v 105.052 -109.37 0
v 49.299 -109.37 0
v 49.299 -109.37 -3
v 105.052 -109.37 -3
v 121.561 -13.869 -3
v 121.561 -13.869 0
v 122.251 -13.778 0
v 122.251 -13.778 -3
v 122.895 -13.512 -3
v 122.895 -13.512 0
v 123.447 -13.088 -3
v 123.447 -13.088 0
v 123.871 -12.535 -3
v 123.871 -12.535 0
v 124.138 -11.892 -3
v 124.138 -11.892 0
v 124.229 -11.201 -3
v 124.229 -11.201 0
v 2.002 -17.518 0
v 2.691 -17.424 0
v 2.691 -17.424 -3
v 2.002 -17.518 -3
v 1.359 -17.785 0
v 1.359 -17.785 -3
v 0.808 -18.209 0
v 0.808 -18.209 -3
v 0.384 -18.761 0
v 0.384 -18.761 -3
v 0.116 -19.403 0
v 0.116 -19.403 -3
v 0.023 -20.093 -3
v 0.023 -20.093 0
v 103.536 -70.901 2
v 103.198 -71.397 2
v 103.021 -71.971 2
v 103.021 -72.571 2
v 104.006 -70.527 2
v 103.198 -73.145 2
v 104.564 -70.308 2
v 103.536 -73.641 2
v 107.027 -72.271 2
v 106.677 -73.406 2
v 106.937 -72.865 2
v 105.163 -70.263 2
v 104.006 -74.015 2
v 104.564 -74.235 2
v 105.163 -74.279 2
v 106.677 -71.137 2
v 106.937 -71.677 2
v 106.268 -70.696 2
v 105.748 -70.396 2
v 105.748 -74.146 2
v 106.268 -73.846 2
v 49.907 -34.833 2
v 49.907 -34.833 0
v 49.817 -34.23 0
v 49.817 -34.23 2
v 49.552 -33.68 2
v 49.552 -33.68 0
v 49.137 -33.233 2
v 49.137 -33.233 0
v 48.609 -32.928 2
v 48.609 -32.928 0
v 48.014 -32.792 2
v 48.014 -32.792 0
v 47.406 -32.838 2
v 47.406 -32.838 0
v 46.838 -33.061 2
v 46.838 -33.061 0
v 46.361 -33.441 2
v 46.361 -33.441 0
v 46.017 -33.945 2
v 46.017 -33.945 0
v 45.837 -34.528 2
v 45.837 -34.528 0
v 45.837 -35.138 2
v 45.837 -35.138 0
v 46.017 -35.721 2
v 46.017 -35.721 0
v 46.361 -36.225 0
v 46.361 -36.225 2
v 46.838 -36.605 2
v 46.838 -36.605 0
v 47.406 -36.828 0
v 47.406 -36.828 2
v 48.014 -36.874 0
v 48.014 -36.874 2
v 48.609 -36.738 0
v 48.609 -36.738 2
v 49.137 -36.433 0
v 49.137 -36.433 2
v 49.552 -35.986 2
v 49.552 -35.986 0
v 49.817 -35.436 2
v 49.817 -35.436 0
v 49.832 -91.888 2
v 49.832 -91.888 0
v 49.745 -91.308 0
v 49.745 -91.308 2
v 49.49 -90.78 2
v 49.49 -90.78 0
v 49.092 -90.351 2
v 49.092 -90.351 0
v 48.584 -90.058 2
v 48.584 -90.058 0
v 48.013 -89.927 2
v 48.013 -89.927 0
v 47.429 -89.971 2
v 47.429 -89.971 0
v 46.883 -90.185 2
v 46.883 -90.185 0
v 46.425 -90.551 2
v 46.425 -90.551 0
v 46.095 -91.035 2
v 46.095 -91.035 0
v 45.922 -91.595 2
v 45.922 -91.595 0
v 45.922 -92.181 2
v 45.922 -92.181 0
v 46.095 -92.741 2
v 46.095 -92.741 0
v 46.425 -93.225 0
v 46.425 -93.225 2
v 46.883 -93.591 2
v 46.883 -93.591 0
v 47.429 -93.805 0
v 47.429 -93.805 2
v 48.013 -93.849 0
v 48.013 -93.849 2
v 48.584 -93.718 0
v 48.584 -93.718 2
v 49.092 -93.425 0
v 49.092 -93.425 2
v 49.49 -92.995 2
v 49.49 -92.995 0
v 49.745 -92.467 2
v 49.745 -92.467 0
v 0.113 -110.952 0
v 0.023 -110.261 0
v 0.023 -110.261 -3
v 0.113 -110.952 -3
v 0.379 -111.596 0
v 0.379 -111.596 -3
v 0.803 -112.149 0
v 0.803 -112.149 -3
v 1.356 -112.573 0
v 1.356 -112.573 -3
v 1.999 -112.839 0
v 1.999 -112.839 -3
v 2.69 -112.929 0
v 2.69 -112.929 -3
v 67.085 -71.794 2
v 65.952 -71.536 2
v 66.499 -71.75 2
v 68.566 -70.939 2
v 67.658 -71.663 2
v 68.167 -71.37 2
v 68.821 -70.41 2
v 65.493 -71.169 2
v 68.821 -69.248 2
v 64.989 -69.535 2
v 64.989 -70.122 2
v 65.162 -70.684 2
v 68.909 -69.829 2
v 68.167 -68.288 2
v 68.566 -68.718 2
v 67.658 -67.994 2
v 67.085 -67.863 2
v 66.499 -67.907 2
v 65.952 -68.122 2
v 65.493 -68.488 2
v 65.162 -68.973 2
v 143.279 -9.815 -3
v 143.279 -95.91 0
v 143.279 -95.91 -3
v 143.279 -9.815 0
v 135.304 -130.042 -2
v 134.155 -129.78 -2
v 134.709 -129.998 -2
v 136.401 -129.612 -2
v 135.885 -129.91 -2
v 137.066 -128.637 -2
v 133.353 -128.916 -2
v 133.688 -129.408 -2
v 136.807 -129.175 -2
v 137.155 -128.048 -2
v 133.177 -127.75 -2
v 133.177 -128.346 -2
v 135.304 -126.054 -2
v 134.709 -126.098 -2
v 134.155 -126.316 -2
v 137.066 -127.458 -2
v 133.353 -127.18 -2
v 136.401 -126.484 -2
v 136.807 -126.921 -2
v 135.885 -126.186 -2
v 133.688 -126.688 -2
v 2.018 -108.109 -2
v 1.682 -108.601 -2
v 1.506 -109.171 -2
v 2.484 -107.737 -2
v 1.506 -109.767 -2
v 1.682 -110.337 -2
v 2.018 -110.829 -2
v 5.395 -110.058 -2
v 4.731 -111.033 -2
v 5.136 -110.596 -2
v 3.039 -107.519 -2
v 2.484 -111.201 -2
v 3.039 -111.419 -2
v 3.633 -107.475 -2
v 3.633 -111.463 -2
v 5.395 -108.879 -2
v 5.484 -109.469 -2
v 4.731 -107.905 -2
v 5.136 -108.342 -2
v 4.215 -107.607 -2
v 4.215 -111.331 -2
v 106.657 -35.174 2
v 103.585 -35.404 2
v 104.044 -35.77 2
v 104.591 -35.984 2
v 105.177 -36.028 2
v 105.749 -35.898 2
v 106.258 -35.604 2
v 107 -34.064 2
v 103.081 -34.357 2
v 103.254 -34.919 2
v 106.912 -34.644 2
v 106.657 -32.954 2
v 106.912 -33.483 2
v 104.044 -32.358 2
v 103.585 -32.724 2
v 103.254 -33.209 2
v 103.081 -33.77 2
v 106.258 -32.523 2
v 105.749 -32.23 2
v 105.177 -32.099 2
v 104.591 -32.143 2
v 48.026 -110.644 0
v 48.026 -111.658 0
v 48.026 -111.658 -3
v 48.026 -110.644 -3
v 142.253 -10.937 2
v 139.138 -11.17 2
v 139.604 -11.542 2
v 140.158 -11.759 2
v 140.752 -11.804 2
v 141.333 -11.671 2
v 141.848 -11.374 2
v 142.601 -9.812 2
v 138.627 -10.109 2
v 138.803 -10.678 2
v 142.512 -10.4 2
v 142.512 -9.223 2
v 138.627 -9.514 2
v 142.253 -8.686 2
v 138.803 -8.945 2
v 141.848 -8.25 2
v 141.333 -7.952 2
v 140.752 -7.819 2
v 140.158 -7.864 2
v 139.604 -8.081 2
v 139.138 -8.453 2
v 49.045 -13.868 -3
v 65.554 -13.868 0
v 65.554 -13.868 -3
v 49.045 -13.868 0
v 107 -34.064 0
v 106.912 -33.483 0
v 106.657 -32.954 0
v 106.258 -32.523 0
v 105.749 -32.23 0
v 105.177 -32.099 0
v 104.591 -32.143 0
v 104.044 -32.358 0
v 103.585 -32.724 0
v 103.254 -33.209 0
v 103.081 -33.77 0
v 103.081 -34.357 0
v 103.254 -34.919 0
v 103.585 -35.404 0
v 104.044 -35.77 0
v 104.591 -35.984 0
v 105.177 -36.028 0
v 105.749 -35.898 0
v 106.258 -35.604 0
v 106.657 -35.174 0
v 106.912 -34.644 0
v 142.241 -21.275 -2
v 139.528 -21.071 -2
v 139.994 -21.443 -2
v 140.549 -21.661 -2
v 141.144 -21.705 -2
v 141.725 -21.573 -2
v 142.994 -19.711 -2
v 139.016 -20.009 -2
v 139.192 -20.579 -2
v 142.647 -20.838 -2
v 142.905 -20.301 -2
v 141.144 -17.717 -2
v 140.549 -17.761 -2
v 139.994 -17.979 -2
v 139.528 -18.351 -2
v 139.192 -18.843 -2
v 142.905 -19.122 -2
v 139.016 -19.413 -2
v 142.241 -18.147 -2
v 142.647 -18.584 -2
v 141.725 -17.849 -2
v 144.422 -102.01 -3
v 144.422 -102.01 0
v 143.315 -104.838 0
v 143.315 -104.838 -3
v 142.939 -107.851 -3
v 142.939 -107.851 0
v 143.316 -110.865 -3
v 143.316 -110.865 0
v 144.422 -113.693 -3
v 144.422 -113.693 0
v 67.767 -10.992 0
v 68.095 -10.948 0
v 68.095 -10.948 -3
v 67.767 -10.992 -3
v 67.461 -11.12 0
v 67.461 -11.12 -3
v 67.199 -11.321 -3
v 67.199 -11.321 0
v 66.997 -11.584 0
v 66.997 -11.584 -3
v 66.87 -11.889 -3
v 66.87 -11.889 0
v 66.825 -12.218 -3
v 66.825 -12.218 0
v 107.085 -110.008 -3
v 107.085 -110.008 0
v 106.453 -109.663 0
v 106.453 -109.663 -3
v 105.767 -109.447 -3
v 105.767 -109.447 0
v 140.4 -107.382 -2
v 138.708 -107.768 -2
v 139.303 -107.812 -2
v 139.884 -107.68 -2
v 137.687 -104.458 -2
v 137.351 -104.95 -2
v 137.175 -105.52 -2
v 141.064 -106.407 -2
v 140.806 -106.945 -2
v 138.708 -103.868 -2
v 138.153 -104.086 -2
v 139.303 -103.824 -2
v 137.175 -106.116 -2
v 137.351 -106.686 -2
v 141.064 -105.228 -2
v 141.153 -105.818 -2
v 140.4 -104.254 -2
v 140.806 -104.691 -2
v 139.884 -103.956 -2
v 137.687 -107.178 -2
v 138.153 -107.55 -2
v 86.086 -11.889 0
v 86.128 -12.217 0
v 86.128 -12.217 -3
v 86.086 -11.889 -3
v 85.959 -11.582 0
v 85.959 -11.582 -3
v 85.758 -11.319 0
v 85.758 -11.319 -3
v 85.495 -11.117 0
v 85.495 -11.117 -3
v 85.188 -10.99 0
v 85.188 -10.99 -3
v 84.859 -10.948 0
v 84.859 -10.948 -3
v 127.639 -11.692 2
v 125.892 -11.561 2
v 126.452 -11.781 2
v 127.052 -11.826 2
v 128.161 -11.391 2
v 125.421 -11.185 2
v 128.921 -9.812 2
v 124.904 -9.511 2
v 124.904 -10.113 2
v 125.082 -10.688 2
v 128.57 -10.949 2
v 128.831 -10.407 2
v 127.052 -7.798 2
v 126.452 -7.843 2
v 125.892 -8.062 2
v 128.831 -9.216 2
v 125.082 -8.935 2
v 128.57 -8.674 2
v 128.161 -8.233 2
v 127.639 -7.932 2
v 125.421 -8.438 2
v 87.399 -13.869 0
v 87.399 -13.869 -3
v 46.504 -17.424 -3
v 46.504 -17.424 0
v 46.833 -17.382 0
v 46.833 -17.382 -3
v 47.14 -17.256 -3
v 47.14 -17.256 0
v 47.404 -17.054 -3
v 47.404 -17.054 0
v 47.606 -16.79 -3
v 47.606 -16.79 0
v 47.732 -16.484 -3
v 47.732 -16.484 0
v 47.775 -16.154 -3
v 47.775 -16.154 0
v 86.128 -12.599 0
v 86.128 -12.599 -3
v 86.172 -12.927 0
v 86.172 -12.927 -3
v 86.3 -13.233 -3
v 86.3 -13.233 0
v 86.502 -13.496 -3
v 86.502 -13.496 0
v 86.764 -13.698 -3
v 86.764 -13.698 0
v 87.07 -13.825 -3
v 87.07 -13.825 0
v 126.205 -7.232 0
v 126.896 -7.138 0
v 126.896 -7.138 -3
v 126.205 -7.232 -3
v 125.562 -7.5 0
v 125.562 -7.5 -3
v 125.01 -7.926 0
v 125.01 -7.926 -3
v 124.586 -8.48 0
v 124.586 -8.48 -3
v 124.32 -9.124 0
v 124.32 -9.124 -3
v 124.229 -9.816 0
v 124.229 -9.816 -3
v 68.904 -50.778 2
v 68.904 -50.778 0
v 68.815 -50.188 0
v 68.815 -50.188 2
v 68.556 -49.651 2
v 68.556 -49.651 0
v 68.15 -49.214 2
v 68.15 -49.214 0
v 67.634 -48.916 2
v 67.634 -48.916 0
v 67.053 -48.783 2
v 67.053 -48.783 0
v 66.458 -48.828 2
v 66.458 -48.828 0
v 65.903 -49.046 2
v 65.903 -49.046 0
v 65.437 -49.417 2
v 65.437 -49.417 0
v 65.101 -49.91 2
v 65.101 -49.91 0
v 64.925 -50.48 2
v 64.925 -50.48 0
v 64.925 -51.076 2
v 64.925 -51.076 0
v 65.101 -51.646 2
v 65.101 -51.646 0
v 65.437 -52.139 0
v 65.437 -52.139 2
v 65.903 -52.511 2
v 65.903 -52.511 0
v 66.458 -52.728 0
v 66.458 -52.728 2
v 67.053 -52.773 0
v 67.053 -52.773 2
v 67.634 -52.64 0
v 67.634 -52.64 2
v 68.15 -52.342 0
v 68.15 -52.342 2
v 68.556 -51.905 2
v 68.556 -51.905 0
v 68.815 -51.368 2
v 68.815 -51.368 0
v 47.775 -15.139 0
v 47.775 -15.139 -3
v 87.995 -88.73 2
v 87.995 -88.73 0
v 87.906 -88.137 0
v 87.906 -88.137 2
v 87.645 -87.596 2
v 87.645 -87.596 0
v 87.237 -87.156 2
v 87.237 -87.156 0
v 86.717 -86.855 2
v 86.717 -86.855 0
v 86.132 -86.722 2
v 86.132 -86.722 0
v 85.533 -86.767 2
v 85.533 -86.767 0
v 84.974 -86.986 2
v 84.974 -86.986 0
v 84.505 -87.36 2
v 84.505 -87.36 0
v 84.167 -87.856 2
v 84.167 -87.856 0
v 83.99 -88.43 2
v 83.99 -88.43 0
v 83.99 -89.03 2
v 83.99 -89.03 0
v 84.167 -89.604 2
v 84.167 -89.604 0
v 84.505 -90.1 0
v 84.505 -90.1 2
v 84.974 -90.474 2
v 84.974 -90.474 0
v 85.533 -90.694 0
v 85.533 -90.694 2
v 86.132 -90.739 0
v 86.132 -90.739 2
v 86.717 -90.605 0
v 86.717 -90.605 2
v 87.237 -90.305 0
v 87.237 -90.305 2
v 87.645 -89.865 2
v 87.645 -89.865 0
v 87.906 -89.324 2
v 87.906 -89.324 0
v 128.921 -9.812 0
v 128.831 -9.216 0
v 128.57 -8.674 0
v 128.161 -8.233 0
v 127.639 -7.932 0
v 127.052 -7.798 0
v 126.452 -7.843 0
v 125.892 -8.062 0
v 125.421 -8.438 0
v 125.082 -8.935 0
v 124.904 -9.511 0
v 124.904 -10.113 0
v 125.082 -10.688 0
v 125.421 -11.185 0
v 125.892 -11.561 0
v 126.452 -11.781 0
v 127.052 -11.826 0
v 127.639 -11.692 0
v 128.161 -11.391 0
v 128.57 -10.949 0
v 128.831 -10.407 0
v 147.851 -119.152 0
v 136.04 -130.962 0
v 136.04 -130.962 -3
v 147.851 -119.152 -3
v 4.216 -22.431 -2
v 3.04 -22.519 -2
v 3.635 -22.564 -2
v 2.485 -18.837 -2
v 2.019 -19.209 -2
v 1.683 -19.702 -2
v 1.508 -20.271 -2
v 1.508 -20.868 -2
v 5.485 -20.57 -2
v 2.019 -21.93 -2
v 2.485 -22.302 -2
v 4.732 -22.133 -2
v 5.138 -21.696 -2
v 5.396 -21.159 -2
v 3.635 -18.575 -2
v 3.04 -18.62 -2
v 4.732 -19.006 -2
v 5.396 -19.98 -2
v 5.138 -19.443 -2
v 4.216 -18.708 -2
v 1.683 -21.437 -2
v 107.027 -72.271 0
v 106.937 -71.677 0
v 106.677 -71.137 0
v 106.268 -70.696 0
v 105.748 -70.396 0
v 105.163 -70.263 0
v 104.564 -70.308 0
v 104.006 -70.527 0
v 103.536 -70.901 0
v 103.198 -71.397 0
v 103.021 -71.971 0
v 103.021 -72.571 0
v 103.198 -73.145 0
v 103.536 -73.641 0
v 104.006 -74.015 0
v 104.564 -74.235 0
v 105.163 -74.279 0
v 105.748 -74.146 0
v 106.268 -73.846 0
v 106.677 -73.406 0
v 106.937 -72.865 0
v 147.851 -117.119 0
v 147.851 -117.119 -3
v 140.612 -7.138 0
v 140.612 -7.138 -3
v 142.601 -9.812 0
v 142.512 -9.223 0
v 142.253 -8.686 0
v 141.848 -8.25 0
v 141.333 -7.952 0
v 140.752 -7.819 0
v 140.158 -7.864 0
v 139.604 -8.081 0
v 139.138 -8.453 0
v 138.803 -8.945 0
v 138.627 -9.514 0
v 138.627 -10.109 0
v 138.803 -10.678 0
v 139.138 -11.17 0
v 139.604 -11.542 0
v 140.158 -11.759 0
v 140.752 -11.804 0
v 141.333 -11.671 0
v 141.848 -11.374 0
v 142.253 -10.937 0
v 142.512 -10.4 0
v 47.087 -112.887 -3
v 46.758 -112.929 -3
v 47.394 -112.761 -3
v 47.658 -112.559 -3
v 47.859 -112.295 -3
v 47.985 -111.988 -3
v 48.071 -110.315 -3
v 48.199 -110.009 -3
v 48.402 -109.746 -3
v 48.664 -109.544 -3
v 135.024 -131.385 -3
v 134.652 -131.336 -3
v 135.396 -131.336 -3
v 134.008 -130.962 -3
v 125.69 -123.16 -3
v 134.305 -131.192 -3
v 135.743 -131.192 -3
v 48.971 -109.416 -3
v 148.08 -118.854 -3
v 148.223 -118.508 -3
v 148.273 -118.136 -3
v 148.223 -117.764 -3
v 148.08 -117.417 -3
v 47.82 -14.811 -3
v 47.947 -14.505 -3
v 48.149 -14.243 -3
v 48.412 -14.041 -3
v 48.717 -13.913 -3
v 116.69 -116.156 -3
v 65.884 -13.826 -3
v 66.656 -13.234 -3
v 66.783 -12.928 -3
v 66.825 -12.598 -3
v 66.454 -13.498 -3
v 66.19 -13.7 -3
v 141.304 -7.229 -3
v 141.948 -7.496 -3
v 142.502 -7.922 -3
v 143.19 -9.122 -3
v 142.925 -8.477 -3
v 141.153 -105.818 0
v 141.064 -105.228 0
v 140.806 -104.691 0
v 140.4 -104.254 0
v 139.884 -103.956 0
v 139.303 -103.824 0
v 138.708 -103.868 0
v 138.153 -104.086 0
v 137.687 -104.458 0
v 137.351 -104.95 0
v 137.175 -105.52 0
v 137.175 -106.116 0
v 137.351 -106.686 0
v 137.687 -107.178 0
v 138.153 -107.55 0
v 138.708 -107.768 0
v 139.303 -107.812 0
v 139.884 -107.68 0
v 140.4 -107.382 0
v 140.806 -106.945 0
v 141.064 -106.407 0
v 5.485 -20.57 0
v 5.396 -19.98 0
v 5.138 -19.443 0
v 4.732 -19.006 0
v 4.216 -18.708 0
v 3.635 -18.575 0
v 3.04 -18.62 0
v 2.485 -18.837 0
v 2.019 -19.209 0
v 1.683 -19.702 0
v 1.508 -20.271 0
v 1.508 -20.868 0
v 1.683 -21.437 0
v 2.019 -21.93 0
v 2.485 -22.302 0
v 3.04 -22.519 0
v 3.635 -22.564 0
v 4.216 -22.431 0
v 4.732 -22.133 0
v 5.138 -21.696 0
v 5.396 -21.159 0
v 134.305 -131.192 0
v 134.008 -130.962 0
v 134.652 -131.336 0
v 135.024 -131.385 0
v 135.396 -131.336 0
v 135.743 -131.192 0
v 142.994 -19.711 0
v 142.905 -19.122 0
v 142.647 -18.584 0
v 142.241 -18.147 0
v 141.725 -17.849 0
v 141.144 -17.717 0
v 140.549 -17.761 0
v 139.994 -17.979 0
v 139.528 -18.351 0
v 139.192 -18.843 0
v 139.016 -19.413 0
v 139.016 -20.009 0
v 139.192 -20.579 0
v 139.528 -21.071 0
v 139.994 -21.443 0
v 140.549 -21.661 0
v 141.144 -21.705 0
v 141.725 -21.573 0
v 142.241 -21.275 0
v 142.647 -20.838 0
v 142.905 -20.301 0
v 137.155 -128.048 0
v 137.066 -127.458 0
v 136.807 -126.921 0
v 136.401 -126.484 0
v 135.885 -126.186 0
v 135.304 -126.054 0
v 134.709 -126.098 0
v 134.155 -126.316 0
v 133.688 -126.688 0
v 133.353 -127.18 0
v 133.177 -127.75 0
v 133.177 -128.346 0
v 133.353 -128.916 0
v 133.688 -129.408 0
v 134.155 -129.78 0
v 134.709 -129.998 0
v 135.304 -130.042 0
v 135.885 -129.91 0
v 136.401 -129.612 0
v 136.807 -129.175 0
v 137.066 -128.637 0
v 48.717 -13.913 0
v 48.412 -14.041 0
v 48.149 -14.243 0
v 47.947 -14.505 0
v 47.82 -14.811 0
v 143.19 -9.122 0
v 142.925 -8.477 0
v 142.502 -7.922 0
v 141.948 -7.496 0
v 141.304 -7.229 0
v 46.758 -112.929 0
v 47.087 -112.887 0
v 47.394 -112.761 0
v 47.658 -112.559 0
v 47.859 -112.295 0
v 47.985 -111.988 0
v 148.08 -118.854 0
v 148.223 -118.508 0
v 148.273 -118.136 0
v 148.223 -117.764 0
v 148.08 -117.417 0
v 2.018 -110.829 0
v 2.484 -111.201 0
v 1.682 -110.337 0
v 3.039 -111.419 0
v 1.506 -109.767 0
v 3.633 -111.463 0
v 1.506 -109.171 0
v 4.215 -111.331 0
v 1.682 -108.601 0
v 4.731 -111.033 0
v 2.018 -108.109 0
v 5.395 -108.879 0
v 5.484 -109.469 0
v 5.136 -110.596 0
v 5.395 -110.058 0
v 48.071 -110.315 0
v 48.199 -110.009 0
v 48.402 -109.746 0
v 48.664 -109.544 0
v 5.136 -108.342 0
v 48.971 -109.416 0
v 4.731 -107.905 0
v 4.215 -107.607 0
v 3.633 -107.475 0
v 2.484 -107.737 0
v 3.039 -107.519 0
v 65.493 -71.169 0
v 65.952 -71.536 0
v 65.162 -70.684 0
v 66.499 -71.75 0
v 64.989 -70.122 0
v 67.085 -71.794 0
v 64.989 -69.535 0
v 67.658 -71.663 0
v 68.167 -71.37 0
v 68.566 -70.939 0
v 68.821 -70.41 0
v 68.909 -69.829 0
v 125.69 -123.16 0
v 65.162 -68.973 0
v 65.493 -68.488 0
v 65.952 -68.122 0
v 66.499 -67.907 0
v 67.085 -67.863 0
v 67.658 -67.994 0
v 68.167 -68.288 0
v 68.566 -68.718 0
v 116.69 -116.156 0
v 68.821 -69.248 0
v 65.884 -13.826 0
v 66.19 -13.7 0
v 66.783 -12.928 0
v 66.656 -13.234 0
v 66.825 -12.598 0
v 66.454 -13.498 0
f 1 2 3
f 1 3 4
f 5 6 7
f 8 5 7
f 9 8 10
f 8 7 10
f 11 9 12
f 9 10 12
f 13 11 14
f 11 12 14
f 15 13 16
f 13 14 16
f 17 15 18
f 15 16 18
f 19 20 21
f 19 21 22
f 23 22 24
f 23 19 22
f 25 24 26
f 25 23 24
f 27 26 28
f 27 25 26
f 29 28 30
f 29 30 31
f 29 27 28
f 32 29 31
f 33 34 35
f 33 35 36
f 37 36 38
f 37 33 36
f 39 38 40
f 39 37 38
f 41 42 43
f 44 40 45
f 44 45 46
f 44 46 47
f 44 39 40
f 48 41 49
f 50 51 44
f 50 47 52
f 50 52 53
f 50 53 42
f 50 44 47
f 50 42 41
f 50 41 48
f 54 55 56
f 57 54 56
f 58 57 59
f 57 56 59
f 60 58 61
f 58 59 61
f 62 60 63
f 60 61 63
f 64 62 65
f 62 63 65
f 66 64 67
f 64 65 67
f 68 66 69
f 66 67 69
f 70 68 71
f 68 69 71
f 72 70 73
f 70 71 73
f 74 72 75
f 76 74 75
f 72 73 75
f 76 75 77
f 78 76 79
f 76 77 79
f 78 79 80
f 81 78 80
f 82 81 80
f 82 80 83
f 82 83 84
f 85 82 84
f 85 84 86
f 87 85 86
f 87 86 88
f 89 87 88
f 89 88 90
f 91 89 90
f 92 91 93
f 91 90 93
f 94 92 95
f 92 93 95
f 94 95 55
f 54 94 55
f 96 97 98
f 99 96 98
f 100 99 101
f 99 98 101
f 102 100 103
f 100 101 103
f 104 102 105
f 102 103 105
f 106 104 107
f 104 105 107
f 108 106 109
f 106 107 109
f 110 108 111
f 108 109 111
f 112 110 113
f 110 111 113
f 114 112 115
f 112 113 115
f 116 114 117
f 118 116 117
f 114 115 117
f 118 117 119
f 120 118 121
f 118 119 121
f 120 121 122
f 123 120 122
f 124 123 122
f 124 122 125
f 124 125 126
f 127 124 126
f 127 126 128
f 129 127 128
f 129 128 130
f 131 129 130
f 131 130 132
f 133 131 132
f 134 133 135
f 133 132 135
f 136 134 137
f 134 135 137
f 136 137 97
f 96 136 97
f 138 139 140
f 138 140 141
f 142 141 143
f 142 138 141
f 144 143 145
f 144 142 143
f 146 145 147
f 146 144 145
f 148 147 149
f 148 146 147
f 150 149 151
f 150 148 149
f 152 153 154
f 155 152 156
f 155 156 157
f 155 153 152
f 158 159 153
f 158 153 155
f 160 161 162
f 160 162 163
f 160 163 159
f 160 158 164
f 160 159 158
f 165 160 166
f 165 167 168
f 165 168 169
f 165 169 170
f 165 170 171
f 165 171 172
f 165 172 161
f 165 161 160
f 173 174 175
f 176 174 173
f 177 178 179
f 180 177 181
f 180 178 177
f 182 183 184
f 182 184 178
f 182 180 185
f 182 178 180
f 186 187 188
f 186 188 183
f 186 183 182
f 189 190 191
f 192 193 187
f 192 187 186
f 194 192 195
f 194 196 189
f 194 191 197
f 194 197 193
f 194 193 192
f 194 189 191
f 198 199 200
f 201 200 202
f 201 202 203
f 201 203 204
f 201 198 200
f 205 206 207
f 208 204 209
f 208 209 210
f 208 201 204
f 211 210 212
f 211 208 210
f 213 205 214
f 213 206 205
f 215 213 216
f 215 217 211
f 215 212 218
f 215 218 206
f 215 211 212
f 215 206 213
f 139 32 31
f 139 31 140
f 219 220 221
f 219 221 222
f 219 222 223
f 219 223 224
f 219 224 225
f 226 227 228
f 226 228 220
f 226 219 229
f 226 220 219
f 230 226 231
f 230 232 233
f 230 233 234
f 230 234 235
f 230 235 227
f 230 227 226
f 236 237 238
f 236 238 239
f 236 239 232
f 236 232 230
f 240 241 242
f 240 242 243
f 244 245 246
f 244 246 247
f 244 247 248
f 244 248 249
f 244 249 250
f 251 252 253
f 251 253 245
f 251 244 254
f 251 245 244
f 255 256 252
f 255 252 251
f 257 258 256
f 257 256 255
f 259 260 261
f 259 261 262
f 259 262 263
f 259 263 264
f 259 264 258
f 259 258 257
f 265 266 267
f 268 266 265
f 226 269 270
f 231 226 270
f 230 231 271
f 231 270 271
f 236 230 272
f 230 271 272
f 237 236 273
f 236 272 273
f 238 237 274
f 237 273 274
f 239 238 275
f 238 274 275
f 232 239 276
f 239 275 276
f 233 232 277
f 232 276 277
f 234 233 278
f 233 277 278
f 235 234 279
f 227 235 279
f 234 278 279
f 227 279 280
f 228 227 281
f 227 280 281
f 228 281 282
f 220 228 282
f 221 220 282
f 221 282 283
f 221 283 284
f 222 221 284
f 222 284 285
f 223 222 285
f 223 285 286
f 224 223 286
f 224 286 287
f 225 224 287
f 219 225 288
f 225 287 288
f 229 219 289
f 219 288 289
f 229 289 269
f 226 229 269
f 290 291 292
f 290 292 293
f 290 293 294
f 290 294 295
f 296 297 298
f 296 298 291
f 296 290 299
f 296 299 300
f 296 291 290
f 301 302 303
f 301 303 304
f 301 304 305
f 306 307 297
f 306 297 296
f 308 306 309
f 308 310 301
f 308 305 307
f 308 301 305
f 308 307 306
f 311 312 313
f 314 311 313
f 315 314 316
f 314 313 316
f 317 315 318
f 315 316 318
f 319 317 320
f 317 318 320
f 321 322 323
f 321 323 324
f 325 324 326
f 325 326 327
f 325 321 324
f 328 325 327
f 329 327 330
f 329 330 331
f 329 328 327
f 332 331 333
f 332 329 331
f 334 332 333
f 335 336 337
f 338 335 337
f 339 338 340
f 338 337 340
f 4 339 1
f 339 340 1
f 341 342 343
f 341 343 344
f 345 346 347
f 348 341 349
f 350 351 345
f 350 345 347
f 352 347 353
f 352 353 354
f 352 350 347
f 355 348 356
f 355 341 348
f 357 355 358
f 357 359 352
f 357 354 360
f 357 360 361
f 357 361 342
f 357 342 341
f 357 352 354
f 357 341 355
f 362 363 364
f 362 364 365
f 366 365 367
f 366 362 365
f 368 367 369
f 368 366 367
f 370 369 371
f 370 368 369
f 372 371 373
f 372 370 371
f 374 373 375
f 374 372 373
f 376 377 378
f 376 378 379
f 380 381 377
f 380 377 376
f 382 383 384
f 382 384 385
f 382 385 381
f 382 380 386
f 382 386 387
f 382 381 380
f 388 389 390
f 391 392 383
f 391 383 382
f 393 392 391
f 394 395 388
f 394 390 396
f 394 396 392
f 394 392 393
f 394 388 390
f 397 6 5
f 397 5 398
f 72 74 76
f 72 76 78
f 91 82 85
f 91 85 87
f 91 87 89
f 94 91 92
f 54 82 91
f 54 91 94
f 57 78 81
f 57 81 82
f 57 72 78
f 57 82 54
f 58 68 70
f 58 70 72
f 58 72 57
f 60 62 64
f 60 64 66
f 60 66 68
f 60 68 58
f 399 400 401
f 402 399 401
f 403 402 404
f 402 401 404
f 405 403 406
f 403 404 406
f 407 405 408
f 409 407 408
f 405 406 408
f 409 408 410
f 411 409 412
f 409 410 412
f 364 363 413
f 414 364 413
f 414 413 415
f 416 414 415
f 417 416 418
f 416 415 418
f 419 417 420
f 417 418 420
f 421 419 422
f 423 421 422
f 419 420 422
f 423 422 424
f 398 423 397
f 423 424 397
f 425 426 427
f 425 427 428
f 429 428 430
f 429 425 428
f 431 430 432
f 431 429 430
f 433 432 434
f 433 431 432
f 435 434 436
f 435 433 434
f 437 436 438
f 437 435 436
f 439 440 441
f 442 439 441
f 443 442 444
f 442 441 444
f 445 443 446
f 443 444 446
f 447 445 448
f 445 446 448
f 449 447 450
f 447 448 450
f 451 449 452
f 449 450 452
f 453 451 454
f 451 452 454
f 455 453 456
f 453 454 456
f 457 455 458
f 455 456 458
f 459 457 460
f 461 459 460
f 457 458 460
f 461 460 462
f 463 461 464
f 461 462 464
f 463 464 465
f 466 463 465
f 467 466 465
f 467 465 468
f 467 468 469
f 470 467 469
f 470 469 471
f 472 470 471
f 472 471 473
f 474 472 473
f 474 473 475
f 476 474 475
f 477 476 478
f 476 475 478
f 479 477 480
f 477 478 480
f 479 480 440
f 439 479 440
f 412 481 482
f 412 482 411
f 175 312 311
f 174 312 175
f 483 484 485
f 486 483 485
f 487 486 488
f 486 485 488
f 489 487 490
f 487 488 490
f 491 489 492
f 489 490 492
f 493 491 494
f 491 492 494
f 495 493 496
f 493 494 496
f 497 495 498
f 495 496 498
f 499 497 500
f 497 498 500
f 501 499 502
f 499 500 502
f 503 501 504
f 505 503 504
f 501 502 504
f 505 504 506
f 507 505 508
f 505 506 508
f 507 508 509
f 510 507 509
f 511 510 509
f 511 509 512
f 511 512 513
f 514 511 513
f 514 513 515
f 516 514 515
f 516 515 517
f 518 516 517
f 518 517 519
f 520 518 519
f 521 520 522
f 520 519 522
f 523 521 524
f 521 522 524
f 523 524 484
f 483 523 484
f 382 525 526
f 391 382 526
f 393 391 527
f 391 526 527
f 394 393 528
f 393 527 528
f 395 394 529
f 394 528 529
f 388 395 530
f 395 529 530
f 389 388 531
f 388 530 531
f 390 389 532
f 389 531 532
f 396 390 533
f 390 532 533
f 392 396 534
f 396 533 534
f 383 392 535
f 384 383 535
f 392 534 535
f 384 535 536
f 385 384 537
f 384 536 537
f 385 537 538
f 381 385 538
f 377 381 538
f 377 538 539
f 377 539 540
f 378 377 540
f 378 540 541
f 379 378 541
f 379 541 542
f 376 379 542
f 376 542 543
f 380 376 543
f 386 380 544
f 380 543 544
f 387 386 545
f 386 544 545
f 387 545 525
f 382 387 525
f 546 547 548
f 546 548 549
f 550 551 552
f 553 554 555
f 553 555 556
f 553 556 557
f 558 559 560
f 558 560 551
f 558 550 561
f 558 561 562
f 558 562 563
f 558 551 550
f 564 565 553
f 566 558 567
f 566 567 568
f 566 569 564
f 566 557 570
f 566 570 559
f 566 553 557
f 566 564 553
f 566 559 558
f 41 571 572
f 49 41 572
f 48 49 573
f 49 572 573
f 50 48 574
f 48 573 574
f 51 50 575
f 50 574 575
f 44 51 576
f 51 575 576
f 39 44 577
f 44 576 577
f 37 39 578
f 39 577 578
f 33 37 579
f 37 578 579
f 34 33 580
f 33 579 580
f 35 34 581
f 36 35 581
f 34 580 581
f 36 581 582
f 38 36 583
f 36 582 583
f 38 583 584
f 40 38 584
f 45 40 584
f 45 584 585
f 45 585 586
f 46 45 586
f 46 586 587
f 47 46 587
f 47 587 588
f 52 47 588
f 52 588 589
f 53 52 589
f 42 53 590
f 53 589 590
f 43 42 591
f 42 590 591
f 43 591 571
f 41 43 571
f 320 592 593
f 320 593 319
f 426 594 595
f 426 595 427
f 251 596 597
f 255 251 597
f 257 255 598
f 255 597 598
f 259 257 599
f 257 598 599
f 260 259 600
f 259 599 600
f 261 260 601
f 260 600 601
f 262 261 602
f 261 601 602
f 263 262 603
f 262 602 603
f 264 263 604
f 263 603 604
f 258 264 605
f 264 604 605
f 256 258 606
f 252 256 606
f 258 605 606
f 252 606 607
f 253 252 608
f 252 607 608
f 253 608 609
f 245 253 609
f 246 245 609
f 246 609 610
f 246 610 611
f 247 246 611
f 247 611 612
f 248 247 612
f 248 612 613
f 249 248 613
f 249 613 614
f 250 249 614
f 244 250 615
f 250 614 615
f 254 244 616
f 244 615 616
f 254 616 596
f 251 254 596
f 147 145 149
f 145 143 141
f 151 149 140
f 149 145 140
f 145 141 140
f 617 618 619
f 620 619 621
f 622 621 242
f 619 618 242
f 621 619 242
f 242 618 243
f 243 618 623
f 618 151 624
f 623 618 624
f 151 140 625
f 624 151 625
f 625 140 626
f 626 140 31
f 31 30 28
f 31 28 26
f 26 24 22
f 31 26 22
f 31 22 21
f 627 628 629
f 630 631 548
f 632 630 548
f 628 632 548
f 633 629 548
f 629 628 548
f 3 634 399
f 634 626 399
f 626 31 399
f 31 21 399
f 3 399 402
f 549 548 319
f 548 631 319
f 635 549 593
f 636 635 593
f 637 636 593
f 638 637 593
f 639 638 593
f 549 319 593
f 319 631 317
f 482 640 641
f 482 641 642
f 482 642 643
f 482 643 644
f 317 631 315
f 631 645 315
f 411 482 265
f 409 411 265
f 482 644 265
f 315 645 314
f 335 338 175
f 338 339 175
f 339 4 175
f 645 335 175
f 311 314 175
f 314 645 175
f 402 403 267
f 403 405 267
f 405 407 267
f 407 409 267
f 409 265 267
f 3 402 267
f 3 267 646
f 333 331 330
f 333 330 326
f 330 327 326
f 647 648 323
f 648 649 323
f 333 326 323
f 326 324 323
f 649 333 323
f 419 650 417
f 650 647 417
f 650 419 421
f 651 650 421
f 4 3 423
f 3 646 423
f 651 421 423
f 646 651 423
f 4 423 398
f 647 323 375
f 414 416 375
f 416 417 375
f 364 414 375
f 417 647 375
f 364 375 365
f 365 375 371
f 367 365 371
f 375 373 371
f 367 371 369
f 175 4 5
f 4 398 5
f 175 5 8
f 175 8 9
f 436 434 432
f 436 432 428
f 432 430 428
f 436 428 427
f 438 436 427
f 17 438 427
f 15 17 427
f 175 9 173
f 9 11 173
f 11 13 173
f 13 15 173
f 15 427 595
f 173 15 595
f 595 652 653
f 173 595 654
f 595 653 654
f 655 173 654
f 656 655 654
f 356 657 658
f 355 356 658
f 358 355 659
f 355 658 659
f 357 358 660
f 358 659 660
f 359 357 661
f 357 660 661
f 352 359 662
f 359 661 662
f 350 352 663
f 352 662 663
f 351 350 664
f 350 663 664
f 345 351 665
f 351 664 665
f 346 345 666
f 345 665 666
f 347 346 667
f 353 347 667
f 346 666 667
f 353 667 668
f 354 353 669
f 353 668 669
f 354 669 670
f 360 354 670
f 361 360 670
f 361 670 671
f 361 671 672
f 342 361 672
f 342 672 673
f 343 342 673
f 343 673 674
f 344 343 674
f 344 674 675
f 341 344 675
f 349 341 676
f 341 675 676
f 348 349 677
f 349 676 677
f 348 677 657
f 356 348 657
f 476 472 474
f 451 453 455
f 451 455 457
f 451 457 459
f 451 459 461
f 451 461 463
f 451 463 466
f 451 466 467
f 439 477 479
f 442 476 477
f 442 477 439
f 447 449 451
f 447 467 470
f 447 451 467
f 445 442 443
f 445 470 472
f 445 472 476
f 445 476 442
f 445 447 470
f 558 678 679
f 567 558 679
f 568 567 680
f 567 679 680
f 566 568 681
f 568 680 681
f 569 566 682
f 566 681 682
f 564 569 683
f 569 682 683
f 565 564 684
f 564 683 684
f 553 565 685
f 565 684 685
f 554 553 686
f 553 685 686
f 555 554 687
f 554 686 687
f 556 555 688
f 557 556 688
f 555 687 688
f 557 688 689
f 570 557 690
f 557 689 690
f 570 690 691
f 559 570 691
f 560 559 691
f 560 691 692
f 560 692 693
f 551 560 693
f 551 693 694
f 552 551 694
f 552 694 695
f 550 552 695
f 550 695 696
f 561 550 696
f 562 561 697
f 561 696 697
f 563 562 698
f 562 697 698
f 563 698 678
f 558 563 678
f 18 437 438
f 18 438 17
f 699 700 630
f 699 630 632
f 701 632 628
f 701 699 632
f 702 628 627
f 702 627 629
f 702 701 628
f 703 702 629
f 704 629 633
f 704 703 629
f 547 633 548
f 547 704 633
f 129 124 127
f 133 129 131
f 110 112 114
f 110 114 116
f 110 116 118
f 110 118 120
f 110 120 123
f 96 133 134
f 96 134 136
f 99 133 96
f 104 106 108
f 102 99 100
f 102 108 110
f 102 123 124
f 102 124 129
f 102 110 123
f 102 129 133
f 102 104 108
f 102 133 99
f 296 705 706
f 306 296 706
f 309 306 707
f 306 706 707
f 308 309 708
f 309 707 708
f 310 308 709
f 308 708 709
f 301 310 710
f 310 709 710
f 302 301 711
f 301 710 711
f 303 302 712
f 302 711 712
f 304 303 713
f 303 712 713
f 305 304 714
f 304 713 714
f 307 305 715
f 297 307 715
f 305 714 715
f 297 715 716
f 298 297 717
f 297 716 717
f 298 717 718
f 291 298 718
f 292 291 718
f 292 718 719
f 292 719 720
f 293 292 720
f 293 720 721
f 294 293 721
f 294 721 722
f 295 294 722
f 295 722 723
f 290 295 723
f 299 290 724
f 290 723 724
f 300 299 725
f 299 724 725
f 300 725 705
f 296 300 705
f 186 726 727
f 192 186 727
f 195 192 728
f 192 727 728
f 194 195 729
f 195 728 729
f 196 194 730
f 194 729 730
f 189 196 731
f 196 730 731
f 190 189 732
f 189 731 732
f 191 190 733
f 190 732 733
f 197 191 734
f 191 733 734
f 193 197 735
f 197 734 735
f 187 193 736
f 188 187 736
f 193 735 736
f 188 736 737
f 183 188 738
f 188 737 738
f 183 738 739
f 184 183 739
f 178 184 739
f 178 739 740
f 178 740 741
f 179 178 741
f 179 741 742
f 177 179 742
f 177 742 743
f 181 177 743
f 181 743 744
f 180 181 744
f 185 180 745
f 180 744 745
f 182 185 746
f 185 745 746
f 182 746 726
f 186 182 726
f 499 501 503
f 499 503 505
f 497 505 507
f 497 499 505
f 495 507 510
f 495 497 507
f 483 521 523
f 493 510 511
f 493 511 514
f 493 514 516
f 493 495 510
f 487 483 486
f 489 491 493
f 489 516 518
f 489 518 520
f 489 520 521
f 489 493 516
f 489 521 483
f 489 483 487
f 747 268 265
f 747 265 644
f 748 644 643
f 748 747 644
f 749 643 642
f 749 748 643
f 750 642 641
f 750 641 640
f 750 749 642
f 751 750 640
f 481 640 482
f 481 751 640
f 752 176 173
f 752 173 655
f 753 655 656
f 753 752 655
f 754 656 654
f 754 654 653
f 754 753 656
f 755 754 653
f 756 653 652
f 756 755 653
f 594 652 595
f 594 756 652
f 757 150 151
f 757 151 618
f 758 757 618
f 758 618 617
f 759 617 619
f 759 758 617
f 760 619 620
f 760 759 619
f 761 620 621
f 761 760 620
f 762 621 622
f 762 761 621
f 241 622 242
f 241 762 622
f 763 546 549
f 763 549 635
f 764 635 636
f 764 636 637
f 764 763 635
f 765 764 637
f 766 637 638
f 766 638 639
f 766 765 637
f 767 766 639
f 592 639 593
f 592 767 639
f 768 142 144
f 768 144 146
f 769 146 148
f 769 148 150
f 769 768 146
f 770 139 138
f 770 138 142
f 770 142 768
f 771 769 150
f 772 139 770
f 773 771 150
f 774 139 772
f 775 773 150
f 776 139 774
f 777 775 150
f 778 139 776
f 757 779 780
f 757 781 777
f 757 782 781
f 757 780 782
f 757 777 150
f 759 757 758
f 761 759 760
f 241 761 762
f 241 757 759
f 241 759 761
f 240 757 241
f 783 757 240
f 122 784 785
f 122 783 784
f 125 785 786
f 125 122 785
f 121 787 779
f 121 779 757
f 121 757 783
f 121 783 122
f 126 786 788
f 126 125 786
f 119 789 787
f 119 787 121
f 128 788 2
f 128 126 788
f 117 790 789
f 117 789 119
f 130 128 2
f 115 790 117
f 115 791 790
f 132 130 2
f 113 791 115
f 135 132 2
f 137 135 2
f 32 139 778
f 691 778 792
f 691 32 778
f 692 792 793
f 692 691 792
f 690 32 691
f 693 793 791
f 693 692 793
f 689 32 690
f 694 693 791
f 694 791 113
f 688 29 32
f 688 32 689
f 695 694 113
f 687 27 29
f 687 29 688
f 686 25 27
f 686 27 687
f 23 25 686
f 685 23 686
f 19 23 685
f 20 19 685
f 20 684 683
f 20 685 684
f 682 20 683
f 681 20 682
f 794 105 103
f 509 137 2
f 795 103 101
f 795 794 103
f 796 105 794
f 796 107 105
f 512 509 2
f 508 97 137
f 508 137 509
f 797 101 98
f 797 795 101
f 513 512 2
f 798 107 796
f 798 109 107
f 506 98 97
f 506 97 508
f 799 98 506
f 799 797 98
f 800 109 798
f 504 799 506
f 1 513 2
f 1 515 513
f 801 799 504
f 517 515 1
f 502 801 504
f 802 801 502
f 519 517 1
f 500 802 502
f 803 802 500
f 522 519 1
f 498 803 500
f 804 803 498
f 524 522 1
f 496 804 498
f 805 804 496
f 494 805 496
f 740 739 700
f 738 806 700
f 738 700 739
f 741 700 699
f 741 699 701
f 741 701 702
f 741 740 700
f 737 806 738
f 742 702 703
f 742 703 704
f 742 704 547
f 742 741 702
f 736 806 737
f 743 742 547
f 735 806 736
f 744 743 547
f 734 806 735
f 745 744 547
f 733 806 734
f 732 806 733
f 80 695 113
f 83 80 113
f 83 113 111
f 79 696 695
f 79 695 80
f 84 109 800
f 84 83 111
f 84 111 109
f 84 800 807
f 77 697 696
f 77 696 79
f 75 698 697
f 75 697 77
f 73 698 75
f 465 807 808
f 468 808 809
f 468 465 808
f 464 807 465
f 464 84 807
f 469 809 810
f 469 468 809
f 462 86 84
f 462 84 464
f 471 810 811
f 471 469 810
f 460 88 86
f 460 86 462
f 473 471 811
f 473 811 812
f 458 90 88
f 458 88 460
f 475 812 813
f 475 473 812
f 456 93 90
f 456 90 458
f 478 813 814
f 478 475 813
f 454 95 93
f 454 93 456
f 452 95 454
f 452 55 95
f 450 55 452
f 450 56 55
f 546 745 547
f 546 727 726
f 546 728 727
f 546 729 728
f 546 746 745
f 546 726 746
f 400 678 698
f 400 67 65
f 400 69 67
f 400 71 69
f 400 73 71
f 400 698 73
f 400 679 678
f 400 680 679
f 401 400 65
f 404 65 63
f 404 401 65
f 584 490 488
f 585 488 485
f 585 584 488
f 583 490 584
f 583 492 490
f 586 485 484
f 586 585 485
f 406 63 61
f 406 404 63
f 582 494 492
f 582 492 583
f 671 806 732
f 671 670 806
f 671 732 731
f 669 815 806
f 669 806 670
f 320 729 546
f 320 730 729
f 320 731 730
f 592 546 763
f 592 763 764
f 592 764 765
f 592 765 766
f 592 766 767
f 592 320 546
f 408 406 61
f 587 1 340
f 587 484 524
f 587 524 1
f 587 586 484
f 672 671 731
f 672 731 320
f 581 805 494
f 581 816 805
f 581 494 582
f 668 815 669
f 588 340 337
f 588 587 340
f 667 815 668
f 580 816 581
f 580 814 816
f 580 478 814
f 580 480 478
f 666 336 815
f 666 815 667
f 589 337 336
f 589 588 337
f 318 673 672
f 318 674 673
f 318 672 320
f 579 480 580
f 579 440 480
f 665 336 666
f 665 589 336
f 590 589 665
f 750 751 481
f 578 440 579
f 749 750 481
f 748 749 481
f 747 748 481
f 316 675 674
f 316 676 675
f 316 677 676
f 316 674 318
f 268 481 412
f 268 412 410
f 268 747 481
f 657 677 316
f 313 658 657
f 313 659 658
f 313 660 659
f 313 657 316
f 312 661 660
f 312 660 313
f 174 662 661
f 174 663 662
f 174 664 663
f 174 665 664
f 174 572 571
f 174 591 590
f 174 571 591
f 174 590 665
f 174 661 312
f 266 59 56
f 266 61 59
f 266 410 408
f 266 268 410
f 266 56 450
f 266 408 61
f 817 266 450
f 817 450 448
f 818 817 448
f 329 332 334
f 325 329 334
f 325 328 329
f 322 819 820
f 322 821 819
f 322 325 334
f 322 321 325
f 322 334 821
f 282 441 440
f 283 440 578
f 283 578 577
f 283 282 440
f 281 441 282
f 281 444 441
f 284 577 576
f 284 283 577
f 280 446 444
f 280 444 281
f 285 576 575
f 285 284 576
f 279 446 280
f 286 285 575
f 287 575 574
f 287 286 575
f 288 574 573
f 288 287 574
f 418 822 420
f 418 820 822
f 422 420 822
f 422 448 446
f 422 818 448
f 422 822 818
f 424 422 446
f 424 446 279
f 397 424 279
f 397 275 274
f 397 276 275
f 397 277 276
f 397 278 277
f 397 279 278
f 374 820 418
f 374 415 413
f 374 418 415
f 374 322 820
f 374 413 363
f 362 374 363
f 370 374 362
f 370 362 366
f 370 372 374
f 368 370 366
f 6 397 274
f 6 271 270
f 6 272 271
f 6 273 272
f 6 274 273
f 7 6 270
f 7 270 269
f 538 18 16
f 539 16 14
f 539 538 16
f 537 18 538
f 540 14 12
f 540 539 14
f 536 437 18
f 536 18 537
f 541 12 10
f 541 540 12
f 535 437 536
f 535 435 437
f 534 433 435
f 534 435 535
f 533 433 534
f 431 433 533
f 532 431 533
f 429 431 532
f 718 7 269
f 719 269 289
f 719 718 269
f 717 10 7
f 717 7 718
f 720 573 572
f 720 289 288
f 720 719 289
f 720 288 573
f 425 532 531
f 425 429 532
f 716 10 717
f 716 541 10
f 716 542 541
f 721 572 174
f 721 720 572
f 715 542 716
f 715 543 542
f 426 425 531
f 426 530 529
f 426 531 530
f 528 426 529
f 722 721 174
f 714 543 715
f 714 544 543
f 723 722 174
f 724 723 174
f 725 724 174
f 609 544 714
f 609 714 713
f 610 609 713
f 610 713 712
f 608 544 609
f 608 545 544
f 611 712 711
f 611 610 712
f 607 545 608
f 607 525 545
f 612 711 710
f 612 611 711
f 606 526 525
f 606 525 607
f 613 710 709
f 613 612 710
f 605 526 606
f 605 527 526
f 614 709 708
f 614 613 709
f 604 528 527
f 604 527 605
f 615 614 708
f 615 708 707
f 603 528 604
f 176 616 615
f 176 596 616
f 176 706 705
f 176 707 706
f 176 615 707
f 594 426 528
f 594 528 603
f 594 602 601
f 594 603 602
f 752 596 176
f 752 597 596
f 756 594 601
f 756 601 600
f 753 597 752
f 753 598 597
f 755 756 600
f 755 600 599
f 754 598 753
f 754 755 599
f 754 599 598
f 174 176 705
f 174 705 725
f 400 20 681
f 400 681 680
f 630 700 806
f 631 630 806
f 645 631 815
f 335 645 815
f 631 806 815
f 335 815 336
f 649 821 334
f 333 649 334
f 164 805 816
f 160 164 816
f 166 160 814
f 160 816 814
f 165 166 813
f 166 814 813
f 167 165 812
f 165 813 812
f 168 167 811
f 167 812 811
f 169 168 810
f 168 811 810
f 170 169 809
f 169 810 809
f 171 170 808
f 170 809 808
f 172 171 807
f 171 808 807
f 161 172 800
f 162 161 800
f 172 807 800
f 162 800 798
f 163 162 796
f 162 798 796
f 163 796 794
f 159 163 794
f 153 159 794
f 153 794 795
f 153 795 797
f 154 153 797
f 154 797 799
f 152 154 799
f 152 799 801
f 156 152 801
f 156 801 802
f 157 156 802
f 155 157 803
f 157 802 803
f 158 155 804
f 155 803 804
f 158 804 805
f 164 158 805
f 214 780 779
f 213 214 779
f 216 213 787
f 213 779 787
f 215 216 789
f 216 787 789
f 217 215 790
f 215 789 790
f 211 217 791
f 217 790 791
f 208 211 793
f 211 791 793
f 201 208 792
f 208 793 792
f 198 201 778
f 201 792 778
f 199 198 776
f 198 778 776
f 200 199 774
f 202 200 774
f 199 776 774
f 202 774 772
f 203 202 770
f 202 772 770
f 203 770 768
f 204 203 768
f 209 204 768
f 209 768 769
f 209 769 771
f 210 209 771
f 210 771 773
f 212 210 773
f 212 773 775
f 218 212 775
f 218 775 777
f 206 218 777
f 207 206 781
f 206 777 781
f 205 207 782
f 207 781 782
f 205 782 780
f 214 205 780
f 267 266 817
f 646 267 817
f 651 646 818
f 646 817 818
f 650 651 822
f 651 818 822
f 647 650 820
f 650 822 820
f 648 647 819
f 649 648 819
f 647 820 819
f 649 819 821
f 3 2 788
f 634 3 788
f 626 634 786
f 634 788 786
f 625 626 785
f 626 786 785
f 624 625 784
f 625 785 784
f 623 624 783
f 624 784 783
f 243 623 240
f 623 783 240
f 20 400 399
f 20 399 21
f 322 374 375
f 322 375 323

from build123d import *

# Parameters (mm, degrees)
PAD_DEPTH       = 3
SKETCH013_R     = 1.970107
SKETCH013_R_2   = 2.014006
SKETCH013_R_3   = 1.966045
SKETCH013_R_4   = 2.046443
SKETCH013_R_5   = 1.971077
SKETCH013_R_6   = 2.0005
SKETCH013_R_7   = 2.019658
SKETCH013_R_8   = 1.997918
PAD014_DEPTH    = 2
SKETCH016_R     = 2
POCKET001_DEPTH = 2


with BuildPart() as part:
    # Sketch → Pad (new body)
    with BuildSketch(Plane.XY):
        with BuildLine():
            ThreePointArc((2.691092, -17.424324), (0.807563, -18.209051), (0.022899, -20.092606))
            Line((0.022899, -20.092606), (0.022899, -110.261101))
            ThreePointArc((0.022899, -110.261101), (0.80276, -112.148767), (2.690309, -112.928909))
            Line((2.690309, -112.928909), (46.758133, -112.928909))
            ThreePointArc((46.758133, -112.928909), (47.657861, -112.558702), (48.026189, -111.658203))
            Line((48.026189, -111.658203), (48.026189, -110.643822))
            ThreePointArc((49.299188, -109.370278), (48.401516, -109.74599), (48.026189, -110.643822))
            Line((49.299188, -109.370278), (105.051811, -109.370278))
            ThreePointArc((107.084557, -110.008187), (106.115549, -109.538299), (105.051811, -109.370278))
            ThreePointArc((134.00774, -130.962361), (121.270775, -119.55423), (107.084557, -110.008187))
            ThreePointArc((134.00774, -130.962361), (135.023899, -131.385154), (136.040024, -130.96228))
            Line((136.040024, -130.96228), (147.850815, -119.15155))
            ThreePointArc((147.850815, -119.15155), (148.27253, -118.135527), (147.850845, -117.119492))
            Line((147.850845, -117.119492), (144.422364, -113.692703))
            ThreePointArc((144.421555, -102.010086), (142.938996, -107.851497), (144.422364, -113.692703))
            Line((144.421555, -102.010086), (143.278885, -95.909729))
            Line((143.278885, -95.909729), (143.278885, -9.814656))
            ThreePointArc((143.278885, -9.814656), (142.501515, -7.922142), (140.611955, -7.137621))
            Line((140.611955, -7.137621), (126.896004, -7.137621))
            ThreePointArc((126.896004, -7.137621), (125.009764, -7.926259), (124.228843, -9.815708))
            Line((124.228843, -9.815708), (124.228843, -11.201195))
            ThreePointArc((121.560973, -13.869035), (123.447403, -13.087617), (124.228843, -11.201195))
            Line((121.560973, -13.869035), (87.398842, -13.869035))
            ThreePointArc((86.128205, -12.598599), (86.501641, -13.495741), (87.398842, -13.869035))
            Line((86.128205, -12.217462), (86.128205, -12.598599))
            ThreePointArc((86.128205, -12.217462), (85.757691, -11.31862), (84.859047, -10.947623))
            Line((84.859047, -10.947623), (68.094903, -10.947623))
            ThreePointArc((68.094903, -10.947623), (67.198822, -11.321427), (66.825078, -12.217532))
            Line((66.825078, -12.598418), (66.825078, -12.217532))
            ThreePointArc((65.554496, -13.868415), (66.453928, -13.497679), (66.825078, -12.598418))
            Line((65.554496, -13.868415), (49.045334, -13.868415))
            ThreePointArc((49.045334, -13.868415), (48.149198, -14.2429), (47.774544, -15.138965))
            Line((47.774544, -15.138965), (47.774544, -16.154249))
            ThreePointArc((46.504146, -17.424324), (47.403928, -17.053937), (47.774544, -16.154249))
            Line((46.504146, -17.424324), (2.691092, -17.424324))
        make_face()
    extrude(amount=-PAD_DEPTH)

    # Sketch013 → Pad014 (join)
    with BuildSketch(Plane.XY):
        with Locations((105.029465, -34.063732)):
            Circle(SKETCH013_R)
        with Locations((85.981422, -88.730209)):
            Circle(SKETCH013_R_2)
        with Locations((47.866016, -91.887985)):
            Circle(SKETCH013_R_3)
        with Locations((47.861008, -34.833092)):
            Circle(SKETCH013_R_4)
        with Locations((66.937889, -69.828568)):
            Circle(SKETCH013_R_5)
        with Locations((66.903061, -50.778069)):
            Circle(SKETCH013_R_6)
        with Locations((126.901398, -9.81155)):
            Circle(SKETCH013_R_7)
        with Locations((140.602615, -9.81155)):
            Circle(SKETCH013_R_8)
        with Locations((105.012505, -72.27108)):
            Circle(SKETCH013_R_2)
    extrude(amount=PAD014_DEPTH)

    # Sketch016 → Pocket001 (cut)
    with BuildSketch(Plane.XY):
        with Locations((135.15451, -128.047943)):
            Circle(SKETCH016_R)
        with Locations((139.153137, -105.817932)):
            Circle(SKETCH016_R)
        with Locations((140.994141, -19.711058)):
            Circle(SKETCH016_R)
        with Locations((3.483953, -109.468971)):
            Circle(SKETCH016_R)
        with Locations((3.485333, -20.56954)):
            Circle(SKETCH016_R)
    extrude(amount=-POCKET001_DEPTH, mode=Mode.SUBTRACT)


solid = part.part
